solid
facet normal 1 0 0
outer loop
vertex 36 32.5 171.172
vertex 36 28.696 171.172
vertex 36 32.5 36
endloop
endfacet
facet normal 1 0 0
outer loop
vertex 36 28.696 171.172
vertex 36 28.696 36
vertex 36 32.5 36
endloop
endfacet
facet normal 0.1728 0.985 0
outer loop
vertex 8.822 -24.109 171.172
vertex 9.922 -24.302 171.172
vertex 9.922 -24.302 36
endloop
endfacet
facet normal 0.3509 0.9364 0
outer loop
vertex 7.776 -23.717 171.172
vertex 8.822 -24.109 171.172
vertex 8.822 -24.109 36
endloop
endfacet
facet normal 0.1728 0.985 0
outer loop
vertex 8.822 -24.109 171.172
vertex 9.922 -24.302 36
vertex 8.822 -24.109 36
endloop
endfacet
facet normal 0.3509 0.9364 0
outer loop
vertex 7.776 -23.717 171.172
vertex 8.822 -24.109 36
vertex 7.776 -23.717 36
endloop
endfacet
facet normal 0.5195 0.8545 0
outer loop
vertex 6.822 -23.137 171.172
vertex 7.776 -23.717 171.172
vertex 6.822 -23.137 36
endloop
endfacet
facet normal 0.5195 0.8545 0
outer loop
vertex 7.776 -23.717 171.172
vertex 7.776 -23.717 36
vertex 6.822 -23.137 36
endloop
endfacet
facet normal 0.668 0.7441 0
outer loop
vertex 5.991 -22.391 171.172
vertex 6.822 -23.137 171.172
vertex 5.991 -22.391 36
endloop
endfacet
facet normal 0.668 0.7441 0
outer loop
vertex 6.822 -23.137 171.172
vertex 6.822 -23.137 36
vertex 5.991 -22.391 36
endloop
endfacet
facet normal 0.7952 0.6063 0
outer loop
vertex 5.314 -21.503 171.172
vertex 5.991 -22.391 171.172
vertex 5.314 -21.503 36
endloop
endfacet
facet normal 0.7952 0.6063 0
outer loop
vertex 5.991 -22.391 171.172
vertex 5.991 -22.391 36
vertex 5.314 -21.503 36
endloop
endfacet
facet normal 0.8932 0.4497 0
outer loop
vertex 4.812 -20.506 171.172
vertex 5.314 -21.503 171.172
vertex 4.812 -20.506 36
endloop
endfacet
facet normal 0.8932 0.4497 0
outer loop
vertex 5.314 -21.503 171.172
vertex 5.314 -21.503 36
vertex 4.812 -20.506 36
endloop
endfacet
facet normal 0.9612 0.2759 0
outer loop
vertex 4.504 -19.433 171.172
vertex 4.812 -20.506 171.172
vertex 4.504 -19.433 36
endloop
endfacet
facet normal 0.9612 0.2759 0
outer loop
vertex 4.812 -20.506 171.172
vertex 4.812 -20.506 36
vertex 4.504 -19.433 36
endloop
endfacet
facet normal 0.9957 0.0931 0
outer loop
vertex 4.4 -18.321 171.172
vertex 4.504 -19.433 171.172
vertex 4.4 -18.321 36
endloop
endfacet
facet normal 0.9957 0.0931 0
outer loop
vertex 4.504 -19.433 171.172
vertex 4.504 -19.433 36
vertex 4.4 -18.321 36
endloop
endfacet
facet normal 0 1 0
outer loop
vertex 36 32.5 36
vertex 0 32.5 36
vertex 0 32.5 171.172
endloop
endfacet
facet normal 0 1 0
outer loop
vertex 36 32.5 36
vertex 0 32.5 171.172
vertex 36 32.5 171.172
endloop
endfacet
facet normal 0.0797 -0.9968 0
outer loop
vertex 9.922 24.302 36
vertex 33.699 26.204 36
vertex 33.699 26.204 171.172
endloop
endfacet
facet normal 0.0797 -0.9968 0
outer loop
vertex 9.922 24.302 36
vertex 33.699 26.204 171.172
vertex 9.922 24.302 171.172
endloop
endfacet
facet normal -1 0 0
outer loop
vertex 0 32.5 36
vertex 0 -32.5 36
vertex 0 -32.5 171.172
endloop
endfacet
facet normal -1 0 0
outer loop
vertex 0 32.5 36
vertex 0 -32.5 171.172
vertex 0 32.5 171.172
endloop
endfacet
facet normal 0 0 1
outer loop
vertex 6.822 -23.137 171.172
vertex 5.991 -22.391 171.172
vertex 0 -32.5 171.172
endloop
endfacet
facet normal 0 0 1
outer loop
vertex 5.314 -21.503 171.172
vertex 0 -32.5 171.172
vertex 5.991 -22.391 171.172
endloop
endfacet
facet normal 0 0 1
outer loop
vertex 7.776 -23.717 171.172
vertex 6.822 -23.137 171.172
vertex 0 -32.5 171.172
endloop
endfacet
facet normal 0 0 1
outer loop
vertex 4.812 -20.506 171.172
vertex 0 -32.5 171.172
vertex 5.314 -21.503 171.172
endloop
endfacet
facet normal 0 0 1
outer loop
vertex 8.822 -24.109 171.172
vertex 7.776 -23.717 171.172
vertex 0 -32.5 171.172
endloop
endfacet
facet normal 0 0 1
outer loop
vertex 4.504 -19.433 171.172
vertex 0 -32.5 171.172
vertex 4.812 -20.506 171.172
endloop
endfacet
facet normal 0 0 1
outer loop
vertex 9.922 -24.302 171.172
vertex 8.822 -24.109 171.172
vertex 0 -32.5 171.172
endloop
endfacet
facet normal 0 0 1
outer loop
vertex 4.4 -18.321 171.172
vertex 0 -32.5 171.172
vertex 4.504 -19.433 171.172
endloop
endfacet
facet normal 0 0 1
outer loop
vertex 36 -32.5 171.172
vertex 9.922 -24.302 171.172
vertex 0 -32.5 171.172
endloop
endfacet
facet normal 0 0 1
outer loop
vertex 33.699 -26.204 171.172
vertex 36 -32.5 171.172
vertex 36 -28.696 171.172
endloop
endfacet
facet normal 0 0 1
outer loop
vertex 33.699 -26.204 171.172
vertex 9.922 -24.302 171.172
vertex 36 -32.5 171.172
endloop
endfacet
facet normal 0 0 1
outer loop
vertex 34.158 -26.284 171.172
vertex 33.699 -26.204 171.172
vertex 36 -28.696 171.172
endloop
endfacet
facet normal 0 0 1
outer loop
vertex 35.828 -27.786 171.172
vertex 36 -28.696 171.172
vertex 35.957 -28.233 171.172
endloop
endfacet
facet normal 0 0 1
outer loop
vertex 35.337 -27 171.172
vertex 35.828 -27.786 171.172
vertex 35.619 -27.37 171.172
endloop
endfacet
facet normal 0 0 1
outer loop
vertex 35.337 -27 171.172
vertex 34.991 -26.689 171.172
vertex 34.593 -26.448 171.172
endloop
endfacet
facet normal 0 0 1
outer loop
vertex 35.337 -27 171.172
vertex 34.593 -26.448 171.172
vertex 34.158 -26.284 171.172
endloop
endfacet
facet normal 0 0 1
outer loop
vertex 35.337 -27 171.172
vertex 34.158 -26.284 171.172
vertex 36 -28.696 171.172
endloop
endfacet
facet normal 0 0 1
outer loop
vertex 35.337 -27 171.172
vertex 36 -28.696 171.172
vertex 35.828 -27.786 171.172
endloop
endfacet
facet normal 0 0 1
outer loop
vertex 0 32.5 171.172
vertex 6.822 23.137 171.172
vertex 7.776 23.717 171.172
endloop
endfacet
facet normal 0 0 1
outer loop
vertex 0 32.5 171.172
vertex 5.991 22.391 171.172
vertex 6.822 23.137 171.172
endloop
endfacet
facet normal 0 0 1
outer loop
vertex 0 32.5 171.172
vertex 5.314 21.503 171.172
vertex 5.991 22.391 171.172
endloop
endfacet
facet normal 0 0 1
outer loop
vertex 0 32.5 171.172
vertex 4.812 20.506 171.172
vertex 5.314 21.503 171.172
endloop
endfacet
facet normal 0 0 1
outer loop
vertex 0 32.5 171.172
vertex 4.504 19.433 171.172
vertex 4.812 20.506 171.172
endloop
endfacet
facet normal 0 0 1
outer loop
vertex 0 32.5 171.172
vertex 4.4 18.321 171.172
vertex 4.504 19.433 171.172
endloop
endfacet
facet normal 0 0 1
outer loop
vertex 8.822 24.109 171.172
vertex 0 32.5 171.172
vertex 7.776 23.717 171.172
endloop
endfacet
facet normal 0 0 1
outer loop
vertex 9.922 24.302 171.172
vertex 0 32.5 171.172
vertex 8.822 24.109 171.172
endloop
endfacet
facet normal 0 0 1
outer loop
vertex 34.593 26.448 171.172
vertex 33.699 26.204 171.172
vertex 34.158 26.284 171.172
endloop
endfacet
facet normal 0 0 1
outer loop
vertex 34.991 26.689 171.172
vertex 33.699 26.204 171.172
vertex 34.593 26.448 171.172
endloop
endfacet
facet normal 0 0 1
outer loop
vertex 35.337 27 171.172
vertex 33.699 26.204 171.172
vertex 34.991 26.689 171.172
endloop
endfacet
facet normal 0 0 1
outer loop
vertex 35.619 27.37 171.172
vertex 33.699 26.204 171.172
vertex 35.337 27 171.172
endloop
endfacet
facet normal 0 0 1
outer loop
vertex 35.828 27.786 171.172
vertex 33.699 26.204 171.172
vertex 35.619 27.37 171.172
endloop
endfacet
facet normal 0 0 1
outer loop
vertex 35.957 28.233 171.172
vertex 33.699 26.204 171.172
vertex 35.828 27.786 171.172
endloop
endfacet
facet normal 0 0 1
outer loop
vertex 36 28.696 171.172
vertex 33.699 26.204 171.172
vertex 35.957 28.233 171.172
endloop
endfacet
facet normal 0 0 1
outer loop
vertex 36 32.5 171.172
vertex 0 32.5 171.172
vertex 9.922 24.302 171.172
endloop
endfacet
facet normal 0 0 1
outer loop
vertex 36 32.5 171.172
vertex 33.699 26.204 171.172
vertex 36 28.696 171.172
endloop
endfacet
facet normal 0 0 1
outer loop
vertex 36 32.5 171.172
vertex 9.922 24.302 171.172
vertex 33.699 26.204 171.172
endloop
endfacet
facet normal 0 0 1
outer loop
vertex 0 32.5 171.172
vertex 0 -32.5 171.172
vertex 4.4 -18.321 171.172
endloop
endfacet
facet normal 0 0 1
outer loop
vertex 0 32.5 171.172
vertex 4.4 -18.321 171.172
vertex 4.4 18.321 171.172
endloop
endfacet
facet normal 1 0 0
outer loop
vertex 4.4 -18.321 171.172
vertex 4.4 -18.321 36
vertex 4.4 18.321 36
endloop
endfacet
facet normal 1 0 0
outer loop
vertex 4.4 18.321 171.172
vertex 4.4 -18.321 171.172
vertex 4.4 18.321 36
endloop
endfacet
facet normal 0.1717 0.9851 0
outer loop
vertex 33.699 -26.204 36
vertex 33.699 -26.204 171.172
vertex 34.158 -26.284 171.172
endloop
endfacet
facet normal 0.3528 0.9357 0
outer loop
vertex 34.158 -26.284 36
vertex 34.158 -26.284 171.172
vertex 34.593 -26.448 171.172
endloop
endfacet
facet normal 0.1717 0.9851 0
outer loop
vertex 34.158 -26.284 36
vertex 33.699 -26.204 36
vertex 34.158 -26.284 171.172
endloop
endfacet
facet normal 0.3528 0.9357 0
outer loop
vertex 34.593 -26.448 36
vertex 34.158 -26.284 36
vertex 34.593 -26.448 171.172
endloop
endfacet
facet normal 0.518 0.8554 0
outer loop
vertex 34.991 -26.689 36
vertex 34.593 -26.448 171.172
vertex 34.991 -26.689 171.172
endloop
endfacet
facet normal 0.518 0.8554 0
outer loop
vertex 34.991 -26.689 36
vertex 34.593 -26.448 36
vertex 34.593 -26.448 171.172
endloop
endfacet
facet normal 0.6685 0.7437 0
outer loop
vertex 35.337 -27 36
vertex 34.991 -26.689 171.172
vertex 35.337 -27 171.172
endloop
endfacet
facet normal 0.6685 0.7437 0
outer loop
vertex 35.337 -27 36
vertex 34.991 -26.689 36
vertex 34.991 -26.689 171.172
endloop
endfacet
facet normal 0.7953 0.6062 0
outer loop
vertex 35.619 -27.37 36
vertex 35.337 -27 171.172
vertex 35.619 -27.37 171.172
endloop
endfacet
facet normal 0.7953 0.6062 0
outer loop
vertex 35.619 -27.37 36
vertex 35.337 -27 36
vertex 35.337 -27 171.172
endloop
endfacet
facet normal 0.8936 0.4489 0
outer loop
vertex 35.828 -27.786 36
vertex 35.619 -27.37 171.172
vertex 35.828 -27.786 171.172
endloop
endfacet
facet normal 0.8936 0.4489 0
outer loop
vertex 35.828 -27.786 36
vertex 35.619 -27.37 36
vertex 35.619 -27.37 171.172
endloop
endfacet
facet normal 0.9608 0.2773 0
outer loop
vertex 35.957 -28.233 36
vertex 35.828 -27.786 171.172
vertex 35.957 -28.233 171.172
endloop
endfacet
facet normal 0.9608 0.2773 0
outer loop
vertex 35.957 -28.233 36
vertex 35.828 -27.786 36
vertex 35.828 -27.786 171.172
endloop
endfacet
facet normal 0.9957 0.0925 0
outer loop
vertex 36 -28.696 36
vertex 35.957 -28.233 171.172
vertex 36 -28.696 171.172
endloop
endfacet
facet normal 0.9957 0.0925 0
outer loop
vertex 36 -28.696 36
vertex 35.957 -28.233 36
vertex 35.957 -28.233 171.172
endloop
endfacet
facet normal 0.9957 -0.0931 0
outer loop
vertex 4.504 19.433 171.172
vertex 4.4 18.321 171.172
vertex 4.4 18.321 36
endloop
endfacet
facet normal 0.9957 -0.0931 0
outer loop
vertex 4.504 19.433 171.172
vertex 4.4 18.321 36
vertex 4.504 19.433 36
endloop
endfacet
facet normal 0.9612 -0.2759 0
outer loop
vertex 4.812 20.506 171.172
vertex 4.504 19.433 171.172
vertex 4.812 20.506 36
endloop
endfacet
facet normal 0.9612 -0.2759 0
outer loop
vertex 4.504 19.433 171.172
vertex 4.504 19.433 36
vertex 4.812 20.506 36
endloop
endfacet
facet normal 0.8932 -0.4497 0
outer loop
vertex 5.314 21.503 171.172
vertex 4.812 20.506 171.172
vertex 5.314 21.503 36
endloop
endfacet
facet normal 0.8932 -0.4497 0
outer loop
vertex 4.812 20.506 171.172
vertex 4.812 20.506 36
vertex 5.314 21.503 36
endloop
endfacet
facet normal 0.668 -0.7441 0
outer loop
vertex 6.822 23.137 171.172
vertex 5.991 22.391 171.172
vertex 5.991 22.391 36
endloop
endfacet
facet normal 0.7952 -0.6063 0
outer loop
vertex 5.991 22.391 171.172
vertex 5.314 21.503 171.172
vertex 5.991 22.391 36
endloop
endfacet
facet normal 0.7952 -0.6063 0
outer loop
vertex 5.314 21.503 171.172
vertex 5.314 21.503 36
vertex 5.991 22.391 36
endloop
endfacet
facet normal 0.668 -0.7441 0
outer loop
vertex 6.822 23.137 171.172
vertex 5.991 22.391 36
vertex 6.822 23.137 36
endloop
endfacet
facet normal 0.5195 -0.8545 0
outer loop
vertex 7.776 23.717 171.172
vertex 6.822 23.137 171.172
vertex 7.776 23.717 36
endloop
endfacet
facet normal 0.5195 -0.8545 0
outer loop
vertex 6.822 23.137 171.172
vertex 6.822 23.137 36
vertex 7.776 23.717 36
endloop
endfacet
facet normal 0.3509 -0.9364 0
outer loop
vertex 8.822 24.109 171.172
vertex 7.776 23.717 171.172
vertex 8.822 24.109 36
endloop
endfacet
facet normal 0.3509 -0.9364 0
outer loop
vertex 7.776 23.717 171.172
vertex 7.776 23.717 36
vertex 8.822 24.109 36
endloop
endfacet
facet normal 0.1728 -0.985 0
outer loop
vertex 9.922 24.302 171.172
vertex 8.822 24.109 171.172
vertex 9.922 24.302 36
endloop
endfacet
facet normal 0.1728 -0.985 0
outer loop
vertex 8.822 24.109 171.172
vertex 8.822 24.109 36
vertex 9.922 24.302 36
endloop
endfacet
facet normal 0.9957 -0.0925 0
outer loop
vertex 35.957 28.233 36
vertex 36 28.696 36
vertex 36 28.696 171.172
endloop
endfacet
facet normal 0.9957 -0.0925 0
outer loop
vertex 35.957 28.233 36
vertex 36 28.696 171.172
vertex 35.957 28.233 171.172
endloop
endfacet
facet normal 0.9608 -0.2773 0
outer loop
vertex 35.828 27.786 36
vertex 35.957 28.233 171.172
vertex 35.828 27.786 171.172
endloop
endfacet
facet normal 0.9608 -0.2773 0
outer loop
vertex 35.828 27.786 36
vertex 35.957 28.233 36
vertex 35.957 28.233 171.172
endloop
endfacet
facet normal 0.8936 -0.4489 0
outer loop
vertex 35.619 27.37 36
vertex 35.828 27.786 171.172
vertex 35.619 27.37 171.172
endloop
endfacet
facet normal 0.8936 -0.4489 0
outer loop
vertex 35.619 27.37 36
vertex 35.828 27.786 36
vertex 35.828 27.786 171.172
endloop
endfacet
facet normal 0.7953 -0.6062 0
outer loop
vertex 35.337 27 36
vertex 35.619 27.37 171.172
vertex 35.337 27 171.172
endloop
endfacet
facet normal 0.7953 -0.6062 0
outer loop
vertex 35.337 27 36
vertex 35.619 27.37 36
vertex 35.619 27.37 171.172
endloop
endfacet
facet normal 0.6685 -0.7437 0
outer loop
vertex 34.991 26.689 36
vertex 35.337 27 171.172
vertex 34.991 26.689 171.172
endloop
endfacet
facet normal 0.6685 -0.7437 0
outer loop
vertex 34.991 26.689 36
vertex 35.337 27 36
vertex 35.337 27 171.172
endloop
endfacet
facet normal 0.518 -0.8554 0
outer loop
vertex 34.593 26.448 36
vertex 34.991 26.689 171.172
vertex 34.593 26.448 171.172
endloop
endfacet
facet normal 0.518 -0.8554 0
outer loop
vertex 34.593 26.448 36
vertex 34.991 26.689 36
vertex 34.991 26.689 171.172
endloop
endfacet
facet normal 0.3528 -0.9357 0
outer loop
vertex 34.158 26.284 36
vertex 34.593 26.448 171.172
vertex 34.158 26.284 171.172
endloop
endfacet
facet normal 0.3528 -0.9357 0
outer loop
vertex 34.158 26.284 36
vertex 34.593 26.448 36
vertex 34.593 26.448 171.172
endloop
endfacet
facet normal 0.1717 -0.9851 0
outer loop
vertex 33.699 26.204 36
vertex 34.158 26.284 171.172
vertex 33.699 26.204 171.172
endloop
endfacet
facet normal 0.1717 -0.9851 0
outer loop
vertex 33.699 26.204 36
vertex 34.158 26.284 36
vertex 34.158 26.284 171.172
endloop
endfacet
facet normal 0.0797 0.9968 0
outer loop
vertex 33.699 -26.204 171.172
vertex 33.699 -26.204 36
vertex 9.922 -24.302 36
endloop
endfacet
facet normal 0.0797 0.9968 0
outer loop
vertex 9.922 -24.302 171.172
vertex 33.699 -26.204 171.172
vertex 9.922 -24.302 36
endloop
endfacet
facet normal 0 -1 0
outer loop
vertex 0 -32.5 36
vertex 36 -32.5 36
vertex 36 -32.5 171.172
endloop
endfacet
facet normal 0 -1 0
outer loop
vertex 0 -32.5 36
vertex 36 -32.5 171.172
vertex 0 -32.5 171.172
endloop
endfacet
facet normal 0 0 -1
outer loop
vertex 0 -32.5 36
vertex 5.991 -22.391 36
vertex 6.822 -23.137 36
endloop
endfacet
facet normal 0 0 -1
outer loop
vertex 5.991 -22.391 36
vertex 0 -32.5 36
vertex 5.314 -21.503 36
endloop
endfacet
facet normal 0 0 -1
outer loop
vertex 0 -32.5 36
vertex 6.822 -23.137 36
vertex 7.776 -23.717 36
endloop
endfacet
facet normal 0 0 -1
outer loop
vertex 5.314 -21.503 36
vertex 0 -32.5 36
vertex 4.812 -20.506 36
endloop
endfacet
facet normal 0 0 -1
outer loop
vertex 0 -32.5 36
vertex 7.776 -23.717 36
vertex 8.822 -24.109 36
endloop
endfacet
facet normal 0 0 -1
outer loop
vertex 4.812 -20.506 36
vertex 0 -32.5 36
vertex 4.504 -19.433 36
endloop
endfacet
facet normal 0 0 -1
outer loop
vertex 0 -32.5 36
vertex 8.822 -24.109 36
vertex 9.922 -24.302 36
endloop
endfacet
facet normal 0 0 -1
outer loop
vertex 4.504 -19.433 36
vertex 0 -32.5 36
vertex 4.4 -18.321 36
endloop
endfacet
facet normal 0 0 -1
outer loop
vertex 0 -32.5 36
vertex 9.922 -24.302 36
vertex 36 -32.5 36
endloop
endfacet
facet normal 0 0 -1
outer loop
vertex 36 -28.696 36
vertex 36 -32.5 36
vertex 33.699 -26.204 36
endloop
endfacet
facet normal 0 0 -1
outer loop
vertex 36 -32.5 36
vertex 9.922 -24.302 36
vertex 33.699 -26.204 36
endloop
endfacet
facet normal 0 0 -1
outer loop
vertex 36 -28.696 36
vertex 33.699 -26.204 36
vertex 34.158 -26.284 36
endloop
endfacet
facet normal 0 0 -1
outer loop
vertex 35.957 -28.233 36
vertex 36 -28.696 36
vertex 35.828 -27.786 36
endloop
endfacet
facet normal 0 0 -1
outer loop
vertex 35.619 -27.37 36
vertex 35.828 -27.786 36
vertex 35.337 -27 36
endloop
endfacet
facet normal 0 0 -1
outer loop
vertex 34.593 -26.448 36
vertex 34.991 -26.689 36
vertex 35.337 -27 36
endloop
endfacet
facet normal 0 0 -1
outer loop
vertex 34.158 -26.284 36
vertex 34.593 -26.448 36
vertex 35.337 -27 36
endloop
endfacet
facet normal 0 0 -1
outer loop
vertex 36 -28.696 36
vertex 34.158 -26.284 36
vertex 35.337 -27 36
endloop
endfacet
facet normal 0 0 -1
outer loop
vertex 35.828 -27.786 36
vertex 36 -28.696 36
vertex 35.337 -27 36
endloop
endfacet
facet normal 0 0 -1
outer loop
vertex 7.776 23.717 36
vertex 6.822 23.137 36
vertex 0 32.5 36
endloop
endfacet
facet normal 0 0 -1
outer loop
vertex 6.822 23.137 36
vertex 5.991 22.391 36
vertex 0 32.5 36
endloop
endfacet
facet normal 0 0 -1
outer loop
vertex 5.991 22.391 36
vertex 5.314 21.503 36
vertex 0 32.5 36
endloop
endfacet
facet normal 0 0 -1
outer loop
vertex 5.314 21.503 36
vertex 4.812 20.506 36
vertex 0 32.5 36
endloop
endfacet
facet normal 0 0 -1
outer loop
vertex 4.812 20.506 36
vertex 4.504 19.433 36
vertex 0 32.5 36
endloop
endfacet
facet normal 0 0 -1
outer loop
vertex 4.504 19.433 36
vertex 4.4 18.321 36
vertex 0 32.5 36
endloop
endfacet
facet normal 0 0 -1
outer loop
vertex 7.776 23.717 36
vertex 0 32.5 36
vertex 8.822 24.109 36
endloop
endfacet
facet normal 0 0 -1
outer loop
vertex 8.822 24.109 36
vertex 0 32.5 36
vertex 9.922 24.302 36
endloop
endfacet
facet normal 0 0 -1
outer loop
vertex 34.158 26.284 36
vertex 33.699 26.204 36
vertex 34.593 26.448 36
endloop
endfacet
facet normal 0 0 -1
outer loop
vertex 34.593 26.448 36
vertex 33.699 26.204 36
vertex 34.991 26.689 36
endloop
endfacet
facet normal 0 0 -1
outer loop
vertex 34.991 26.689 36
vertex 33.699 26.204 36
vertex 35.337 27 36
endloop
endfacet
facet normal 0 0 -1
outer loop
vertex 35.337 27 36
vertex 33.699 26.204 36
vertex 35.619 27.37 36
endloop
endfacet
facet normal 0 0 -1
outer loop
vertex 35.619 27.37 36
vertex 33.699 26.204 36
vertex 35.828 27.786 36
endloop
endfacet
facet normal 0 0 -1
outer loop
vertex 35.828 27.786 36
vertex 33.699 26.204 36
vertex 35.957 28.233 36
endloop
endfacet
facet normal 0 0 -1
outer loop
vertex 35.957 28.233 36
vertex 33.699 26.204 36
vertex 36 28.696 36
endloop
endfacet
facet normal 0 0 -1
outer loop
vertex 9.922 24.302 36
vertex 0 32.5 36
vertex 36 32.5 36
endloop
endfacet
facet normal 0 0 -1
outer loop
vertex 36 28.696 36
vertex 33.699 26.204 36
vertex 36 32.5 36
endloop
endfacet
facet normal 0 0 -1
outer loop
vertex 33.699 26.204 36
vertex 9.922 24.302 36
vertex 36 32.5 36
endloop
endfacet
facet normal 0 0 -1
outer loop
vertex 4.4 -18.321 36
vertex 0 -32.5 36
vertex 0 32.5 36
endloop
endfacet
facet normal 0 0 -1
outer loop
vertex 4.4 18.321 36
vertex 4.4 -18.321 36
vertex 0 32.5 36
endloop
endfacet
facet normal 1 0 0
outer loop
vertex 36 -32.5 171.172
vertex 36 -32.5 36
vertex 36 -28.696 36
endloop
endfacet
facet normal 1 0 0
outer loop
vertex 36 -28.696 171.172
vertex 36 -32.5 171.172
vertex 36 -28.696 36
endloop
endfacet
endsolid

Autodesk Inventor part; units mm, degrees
ref_plane "Начальная плоскость" through (0, 0, 36) normal (0, 0, 1) x (1, 0, 0)
ref_plane "Конечная плоскость" through (0, 0, 171.172) normal (0, 0, 1) x (1, 0, 0)
sketch "Эскиз" plane through (0, 0, 0) normal (0, 0, 1) x (1, 0, 0)
  line L0 (36, -32.5) -> (0, -32.5)
  line L1 (36, -32.5) -> (36, -28.696)
  line L2 (33.6994, -26.2039) -> (9.9215, -24.3017)
  line L3 (4.4, -18.3208) -> (4.4, 18.3208)
  line L4 (33.6994, 26.2039) -> (9.9215, 24.3017)
  line L5 (36, 28.696) -> (36, 32.5)
  line L6 (0, 32.5) -> (36, 32.5)
  line L7 (0, -32.5) -> (0, 32.5)
  arc A0 (4.4, -18.3208) -> (9.9215, -24.3017) centre (10.4, -18.3208) ccw
  arc A1 (9.9215, 24.3017) -> (4.4, 18.3208) centre (10.4, 18.3208) ccw
  arc A2 (36, -28.696) -> (33.6994, -26.2039) centre (33.5, -28.696) ccw
  arc A3 (33.6994, 26.2039) -> (36, 28.696) centre (33.5, 28.696) ccw
  line L8 (0, 45.5) -> (0, -45.5) construction
  line L9 (-7.2974, 0) -> (43.7847, 0) construction
  point P0 (36, -26.388)
  point P1 (4.4, -23.86)
  point P2 (4.4, 23.86)
  point P3 (36, 26.388)
  dimension "d3" = 36
  dimension "d5" = 4.4
  dimension "d7" = 65
  dimension "d9" = 8.64
  dimension "d11" = 8.64
  dimension "d13" = 6.112
  dimension "d15" = 6.112
  dimension "d22" = 6
  dimension "d23" = 2.5
  dimension "d24" = 32.5
  dimension "d25" = 0
extrude "Тело" add sketch "Эскиз" along normal up to surface (135.172 mm away) from surface at 36
sketch "Sketch3" plane through (0, 0, 0) normal (0, 0, 1) x (1, 0, 0)
  line L0 (0, 0) -> (10, 0)
ref_plane "Work Plane7" through (0, 0, 0) normal (0, -1, 0) x (1, 0, 0)
sketch "Sketch4" plane through (0, 0, 0) normal (0, -1, 0) x (1, 0, 0)
  line L0 (-2, 36) -> (12, 36)
  line L1 (-2, 171.172) -> (12, 171.172)
  dimension "d29" = 135.172
ref_plane "РабПлоскость8" through (-343.772, 32.5, 171.172) normal (0, 0, 1) x (1, 0, 0)
split "Разделение1" plane through (-343.772, 32.5, 171.172) removes the side toward (0, 0, 1)
ref_plane "РабПлоскость9" through (-343.772, -32.5, 36) normal (0, 0, -1) x (-1, 0, 0)
split "Разделение2" plane through (-343.772, -32.5, 36) removes the side toward (0, 0, -1)
equation "\"d3\" = b"
equation "\"d5\" = t1"
equation "\"d7\" = ParH"
equation "\"d9\" = msp_x1 + t2"
equation "\"d11\" = msp_x1 + t2"
equation "\"d13\" = -msp_x2 + t2"
equation "\"d15\" = -msp_x2 + t2"
equation "\"d22\" = R"
equation "\"d23\" = R1"
equation "\"d24\" = 0.5 * d7"
equation "\"d16\" = G_L"
equation "\"R1\" = 2.5"
equation "\"R\" = 6"
equation "\"t1\" = 4.4"
equation "\"t2\" = 7.2"
equation "\"ParH\" = 65"
equation "\"b\" = 36"
equation "\"msp_x1\" = 0.04 * b"
equation "\"msp_x2\" = -0.08 * t1 + 0.04 * b"
equation "\"G_L\" = d29"
equation "\"ex\" = 0"
equation "\"G_OFFSET_START\" = -36"
equation "\"G_OFFSET_END\" = -36"
equation "\"d26\" = -G_OFFSET_START"
equation "\"d27\" = G_OFFSET_END + B_L"
equation "\"B_L\" = 207.172"
properties part number "Швеллер 6.5U-135,17 ГОСТ 8240-97" material "Сталь, мягкая"
